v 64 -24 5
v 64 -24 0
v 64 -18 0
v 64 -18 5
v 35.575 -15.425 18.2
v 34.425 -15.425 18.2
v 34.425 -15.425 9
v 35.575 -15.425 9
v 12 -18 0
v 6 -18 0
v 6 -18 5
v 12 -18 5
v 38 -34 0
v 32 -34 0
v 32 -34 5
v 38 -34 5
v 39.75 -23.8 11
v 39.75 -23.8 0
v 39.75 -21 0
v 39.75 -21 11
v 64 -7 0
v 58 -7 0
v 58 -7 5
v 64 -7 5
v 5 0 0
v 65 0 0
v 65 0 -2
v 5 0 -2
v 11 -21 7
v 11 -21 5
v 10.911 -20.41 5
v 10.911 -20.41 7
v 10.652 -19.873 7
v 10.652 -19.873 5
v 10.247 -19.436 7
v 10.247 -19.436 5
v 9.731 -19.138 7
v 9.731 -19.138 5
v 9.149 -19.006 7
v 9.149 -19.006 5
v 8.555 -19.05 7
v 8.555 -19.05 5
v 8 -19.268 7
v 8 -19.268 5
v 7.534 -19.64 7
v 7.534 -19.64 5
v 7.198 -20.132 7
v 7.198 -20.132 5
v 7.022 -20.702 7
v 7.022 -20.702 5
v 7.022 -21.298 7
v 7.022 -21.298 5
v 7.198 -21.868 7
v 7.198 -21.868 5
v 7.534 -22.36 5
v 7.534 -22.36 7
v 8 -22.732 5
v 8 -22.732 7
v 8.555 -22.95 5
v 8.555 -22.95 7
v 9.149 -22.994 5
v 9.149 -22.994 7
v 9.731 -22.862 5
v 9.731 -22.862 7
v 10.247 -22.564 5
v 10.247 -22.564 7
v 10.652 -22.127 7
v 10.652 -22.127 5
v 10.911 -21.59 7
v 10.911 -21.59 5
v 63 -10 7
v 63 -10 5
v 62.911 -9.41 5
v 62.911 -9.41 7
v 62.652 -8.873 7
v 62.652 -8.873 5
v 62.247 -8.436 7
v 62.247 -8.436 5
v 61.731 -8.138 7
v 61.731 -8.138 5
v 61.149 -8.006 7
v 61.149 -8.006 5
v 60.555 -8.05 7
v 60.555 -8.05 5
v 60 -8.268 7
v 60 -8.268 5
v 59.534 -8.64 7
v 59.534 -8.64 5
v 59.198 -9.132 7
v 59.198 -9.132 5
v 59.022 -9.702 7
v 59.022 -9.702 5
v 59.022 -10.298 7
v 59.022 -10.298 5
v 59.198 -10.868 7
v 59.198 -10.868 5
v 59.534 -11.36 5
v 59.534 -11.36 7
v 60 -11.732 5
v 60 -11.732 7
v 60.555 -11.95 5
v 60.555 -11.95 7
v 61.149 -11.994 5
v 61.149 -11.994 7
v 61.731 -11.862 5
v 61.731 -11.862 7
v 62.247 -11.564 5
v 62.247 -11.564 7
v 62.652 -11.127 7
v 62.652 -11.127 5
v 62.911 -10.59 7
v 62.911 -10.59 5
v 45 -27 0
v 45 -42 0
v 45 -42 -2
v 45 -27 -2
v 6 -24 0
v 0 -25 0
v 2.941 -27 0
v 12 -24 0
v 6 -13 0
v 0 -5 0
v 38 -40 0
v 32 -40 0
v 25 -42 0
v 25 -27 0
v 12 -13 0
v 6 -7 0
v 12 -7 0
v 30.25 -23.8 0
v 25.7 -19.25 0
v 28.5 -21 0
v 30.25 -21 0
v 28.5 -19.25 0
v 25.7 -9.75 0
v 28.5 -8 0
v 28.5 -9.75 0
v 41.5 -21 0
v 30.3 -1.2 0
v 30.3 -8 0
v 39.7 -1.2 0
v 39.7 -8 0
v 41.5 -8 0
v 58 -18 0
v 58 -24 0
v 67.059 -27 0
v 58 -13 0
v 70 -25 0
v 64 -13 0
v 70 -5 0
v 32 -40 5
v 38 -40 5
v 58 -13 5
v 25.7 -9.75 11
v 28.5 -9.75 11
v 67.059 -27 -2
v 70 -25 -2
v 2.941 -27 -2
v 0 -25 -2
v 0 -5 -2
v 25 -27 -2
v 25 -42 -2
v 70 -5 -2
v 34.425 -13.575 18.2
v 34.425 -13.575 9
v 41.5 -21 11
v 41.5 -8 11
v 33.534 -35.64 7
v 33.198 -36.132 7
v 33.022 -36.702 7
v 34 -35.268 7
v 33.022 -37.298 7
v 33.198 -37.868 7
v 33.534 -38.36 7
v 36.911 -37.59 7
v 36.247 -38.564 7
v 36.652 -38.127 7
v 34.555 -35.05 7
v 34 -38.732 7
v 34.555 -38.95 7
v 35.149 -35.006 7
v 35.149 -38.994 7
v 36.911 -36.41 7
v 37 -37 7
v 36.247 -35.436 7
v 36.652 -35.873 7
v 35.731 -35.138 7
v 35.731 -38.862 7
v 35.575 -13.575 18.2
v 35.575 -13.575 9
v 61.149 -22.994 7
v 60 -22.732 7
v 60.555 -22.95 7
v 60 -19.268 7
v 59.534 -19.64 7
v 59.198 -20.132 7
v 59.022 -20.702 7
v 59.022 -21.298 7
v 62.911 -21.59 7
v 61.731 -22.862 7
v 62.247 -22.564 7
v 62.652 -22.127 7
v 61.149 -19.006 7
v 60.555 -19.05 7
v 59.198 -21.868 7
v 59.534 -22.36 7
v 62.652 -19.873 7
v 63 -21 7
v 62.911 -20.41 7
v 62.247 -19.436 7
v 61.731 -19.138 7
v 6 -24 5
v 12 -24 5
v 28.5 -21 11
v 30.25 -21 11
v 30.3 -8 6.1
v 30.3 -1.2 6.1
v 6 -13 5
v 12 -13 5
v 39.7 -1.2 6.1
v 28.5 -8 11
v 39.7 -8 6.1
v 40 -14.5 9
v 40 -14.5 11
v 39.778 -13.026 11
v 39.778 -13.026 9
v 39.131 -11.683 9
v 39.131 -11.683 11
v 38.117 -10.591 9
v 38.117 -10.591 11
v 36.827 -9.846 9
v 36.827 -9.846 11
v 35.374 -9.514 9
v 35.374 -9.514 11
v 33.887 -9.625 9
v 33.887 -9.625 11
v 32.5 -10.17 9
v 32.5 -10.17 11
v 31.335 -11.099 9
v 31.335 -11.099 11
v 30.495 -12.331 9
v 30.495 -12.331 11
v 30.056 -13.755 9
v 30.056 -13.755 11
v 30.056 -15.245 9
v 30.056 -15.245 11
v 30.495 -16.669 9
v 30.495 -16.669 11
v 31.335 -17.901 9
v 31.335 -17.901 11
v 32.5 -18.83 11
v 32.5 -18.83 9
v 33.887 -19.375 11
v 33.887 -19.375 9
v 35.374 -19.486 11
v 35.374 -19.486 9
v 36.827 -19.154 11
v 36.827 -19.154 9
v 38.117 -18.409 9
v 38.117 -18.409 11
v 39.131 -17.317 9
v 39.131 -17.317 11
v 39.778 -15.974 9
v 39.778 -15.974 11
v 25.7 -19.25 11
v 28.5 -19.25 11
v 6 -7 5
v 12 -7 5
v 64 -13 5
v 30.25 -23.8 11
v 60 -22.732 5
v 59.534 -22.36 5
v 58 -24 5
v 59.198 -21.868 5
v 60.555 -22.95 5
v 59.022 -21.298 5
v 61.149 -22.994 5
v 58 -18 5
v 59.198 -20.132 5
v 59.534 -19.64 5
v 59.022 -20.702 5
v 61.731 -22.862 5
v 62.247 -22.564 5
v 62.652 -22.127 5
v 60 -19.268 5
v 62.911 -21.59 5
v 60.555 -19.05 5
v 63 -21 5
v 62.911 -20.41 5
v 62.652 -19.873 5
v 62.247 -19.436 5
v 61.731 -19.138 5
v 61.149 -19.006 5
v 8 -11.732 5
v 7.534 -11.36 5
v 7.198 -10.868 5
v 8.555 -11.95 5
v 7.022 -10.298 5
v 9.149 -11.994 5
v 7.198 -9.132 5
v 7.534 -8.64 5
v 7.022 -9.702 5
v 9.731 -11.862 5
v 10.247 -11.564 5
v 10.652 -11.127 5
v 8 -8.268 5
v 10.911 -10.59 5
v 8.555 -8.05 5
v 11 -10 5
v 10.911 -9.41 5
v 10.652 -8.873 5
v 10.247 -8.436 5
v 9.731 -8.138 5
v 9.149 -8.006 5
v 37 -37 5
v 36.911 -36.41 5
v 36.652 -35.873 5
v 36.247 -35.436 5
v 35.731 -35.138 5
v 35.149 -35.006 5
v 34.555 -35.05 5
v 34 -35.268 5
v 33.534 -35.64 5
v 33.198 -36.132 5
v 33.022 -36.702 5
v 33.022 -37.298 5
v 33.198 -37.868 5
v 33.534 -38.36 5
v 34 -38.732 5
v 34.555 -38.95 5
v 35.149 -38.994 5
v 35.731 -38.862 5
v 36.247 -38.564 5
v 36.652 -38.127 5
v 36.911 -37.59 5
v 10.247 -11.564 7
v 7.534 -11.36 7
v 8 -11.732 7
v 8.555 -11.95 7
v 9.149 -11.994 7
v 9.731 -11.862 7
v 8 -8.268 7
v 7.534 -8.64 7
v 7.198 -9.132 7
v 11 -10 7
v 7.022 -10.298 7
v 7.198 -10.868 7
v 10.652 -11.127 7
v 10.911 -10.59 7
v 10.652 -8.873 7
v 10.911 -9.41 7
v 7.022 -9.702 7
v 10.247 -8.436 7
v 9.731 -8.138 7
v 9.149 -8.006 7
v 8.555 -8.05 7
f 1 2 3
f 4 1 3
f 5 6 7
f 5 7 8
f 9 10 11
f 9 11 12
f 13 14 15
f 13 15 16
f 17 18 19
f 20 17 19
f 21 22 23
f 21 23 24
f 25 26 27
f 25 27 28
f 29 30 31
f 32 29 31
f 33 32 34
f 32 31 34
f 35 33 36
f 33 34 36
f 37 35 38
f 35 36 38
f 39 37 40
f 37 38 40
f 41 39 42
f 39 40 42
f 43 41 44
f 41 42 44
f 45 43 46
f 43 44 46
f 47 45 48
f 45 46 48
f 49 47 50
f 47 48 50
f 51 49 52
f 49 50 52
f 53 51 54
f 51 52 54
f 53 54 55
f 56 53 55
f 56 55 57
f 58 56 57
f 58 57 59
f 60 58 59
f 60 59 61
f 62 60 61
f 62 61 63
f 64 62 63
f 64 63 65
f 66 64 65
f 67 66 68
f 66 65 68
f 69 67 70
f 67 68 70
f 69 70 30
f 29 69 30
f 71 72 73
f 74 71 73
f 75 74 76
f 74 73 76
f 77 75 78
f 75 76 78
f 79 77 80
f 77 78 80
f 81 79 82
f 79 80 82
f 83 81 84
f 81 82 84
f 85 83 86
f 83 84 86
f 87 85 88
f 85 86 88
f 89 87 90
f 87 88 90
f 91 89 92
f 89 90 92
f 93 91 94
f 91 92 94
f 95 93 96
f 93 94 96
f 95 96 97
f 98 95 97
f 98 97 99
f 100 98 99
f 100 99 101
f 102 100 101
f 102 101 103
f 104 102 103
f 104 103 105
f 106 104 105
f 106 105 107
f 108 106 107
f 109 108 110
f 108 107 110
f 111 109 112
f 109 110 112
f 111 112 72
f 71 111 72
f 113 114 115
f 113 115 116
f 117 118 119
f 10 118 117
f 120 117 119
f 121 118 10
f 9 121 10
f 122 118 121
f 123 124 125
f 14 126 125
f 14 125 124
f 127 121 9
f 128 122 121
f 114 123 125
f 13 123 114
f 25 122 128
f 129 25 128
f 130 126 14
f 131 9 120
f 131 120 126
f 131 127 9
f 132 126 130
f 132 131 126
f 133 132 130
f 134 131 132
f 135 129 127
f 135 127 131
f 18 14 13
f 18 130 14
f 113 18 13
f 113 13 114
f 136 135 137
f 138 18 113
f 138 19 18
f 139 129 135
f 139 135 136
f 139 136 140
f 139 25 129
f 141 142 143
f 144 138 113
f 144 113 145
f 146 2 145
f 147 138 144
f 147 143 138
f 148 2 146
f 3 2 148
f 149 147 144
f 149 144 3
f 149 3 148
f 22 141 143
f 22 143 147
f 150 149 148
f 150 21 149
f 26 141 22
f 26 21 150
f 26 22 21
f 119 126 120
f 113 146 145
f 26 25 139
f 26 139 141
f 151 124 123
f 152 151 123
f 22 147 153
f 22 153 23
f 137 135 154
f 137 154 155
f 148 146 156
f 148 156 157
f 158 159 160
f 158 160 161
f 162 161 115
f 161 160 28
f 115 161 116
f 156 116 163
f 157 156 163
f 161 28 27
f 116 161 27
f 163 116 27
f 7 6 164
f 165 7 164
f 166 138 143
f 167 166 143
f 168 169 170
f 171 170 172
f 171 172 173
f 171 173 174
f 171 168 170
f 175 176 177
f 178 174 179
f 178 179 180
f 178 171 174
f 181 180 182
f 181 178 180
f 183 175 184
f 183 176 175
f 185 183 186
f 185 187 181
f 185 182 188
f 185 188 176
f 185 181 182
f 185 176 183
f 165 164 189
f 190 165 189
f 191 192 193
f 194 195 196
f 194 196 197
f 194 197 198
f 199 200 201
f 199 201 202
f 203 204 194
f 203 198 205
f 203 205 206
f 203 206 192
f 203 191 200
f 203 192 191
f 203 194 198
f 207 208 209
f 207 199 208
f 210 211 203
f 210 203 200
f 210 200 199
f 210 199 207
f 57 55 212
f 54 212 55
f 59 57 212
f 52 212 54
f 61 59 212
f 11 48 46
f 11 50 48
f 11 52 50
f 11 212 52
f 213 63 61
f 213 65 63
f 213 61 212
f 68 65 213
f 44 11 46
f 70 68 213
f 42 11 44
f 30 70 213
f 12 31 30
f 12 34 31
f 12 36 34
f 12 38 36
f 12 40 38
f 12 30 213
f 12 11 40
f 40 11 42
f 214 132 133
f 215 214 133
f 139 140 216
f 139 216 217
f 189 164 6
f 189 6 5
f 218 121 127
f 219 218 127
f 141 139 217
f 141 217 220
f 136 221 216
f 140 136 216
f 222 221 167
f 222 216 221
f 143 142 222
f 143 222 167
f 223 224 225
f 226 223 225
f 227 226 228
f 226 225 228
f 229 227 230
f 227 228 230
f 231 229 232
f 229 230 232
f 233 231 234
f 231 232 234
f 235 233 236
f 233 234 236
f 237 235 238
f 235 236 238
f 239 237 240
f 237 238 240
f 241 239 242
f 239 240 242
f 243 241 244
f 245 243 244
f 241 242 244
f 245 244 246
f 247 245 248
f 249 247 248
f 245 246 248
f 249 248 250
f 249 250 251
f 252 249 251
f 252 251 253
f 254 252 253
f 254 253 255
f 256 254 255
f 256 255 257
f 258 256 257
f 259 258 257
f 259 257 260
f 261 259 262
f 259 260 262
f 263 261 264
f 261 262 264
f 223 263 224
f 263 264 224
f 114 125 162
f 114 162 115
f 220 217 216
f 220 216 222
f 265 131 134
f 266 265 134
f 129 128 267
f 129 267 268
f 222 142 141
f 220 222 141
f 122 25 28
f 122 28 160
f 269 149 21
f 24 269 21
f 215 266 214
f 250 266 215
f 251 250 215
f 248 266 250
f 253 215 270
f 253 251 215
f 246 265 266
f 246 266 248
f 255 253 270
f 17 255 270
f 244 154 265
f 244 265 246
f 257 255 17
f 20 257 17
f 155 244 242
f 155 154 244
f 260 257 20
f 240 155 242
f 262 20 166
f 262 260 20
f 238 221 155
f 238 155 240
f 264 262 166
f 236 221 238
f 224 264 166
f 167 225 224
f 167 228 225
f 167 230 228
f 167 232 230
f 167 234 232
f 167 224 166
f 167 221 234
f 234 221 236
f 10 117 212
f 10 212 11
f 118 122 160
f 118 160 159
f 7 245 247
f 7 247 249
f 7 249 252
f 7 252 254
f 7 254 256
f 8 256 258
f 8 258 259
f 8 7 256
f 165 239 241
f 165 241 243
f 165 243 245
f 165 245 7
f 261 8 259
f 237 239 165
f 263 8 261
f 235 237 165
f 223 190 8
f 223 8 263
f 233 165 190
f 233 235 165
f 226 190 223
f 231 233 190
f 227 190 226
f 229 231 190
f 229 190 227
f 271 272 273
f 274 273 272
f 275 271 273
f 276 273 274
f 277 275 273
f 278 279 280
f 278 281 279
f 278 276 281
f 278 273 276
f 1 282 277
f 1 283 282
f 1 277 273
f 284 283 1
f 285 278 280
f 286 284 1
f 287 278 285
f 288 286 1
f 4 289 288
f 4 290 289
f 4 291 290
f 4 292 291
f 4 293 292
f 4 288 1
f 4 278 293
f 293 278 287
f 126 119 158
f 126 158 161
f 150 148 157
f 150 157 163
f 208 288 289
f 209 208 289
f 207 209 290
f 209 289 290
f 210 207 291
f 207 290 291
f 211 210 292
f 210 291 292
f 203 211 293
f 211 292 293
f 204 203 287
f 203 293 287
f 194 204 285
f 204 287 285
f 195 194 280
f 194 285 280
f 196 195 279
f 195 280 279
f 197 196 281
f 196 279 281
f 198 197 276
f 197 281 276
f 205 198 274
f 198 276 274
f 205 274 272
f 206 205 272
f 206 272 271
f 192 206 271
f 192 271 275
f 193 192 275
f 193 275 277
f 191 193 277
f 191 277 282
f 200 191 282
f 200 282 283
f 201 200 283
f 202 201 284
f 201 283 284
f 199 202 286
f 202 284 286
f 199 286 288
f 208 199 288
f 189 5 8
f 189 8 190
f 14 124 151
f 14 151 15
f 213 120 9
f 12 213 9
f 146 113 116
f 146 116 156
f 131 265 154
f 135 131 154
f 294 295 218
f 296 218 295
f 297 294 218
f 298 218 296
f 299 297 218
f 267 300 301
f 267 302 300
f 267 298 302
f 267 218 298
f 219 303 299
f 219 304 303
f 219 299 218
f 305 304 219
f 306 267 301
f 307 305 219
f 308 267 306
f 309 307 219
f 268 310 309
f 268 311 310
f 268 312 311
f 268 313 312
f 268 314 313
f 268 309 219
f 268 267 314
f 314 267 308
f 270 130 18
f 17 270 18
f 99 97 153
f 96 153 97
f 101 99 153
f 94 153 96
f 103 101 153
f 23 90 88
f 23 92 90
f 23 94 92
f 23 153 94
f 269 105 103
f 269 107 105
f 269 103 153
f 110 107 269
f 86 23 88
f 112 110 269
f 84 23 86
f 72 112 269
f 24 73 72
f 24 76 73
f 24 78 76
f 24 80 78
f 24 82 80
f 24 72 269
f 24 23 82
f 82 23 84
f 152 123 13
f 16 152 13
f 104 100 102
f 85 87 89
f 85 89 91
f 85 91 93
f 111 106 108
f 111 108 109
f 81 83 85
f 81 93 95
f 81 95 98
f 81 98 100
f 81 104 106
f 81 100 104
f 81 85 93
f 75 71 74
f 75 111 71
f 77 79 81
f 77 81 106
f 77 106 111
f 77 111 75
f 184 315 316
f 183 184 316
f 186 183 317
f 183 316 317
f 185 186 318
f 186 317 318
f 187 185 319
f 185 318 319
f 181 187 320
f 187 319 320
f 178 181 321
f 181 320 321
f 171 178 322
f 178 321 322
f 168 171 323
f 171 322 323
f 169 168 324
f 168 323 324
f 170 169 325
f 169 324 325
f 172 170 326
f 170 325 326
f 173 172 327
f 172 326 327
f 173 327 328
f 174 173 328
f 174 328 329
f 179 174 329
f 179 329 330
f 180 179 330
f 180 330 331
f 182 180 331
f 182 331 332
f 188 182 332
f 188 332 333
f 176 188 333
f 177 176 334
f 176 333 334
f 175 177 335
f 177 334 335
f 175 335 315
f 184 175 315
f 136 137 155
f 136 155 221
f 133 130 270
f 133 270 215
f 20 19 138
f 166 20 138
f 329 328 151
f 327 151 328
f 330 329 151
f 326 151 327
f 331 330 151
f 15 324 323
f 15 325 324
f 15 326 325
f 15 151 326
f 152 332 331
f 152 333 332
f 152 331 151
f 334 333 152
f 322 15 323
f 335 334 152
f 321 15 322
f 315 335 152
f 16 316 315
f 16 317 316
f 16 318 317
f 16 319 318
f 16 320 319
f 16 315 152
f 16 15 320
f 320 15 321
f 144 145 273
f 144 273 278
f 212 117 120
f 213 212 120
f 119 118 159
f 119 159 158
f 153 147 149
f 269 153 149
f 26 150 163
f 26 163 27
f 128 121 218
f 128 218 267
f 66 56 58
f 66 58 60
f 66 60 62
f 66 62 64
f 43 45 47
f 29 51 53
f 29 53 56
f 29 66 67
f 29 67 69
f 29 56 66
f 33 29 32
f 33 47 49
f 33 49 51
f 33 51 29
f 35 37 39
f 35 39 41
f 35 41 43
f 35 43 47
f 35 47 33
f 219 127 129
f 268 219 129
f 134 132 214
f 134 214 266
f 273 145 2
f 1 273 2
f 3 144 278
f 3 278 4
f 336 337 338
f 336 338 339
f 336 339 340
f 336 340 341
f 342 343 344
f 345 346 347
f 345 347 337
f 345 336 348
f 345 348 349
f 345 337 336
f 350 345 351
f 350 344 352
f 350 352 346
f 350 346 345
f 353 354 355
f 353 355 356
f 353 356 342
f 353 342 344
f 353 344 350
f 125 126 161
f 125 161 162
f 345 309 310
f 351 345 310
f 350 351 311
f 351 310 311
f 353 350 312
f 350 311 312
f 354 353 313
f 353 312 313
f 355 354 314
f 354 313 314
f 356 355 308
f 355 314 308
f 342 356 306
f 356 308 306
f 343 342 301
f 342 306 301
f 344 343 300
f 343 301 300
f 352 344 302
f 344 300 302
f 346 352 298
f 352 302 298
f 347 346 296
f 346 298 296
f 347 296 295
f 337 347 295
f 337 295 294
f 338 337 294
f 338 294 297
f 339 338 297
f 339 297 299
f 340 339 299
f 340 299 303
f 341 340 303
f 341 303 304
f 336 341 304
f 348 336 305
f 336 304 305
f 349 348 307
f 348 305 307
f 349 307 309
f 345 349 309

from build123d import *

# Parameters (mm, degrees)
EXTRUSION1_DEPTH             = 2
ESQUISSE2_W                  = 13
ESQUISSE2_H                  = 13
EXTRUSION2_DEPTH             = 11
ESQUISSE7_W                  = 9.4
ESQUISSE7_H                  = 6.8
EXTRUSION7_DEPTH             = 6.1
ESQUISSE8_W                  = 2.8
ESQUISSE8_H                  = 9.5
ESQUISSE8_W_2                = 9.5
ESQUISSE8_H_2                = 2.8
EXTRUSION8_DEPTH             = 11
ESQUISSE6_R                  = 5
EXTRUSION6_DEPTH             = 2
ESQUISSE3_W                  = 6
ESQUISSE3_H                  = 6
EXTRUSION3_DEPTH             = 5
ESQUISSE5_R                  = 2
EXTRUSION5_DEPTH             = 2
ESQUISSE9_W                  = 1.15
ESQUISSE9_H                  = 1.85
EXTRUSION9_DEPTH             = 7.2
EXTRUSION9_DIRECTION_2_REACH = 84.662


with BuildPart() as part:
    # Esquisse1 → Extrusion1 (new body)
    with BuildSketch(Plane.XY):
        Polygon((2.941176471, -27), (25, -27), (25, -42), (45, -42), (45, -27), (67.058823529, -27), (70, -25), (70, -5), (65, 0), (5, 0), (0, -5), (0, -25), align=None)
    extrude(amount=-EXTRUSION1_DEPTH)

    # Esquisse2 → Extrusion2 (add)
    with BuildSketch(Plane.XY):
        with Locations((35, -14.5)):
            Rectangle(ESQUISSE2_W, ESQUISSE2_H)
    extrude(amount=EXTRUSION2_DEPTH)

    # Esquisse7 → Extrusion7 (add)
    with BuildSketch(Plane.XY):
        with Locations((35, -4.6)):
            Rectangle(ESQUISSE7_W, ESQUISSE7_H)
    extrude(amount=EXTRUSION7_DEPTH)

    # Esquisse8 → Extrusion8 (add)
    with BuildSketch(Plane.XY):
        with Locations((27.1, -14.5)):
            Rectangle(ESQUISSE8_W, ESQUISSE8_H)
        with Locations((35, -22.4)):
            Rectangle(ESQUISSE8_W_2, ESQUISSE8_H_2)
    extrude(amount=EXTRUSION8_DEPTH)

    # Esquisse6 → Extrusion6 (cut)
    with BuildSketch(Plane.XY.offset(11)):
        with Locations((35, -14.5)):
            Circle(ESQUISSE6_R)
    extrude(amount=-EXTRUSION6_DEPTH, mode=Mode.SUBTRACT)

    # Esquisse3 → Extrusion3 (add)
    with BuildSketch(Plane.XY):
        with Locations((9, -21)):
            Rectangle(ESQUISSE3_W, ESQUISSE3_H)
        with Locations((9, -10)):
            Rectangle(ESQUISSE3_W, ESQUISSE3_H)
        with Locations((35, -37)):
            Rectangle(ESQUISSE3_W, ESQUISSE3_H)
        with Locations((61, -10)):
            Rectangle(ESQUISSE3_W, ESQUISSE3_H)
        with Locations((61, -21)):
            Rectangle(ESQUISSE3_W, ESQUISSE3_H)
    extrude(amount=EXTRUSION3_DEPTH)

    # Esquisse5 → Extrusion5 (add)
    with BuildSketch(Plane.XY.offset(5)):
        with Locations((9, -10)):
            Circle(ESQUISSE5_R)
        with Locations((9, -21)):
            Circle(ESQUISSE5_R)
        with Locations((61, -21)):
            Circle(ESQUISSE5_R)
        with Locations((61, -10)):
            Circle(ESQUISSE5_R)
        with Locations((35, -37)):
            Circle(ESQUISSE5_R)
    extrude(amount=EXTRUSION5_DEPTH)

    # Esquisse9 → Extrusion9 (add)
    with BuildSketch(Plane.XY.offset(11)):
        with Locations((35, -14.5)):
            Rectangle(ESQUISSE9_W, ESQUISSE9_H)
    extrude(amount=EXTRUSION9_DEPTH)

    # Esquisse9 → Extrusion9 direction 2 (add, up to next)
    with BuildSketch(Plane.XY.offset(11), mode=Mode.PRIVATE) as extrusion9_direction_2_sk1:
        with Locations((35, -14.5)):
            Rectangle(ESQUISSE9_W, ESQUISSE9_H)
    extrusion9_direction_2_tool1 = extrude(extrusion9_direction_2_sk1.sketch, amount=-EXTRUSION9_DIRECTION_2_REACH, mode=Mode.PRIVATE) - part.part
    add(extrusion9_direction_2_tool1.solids().sort_by_distance((35, -14.5, 11))[0])


solid = part.part
